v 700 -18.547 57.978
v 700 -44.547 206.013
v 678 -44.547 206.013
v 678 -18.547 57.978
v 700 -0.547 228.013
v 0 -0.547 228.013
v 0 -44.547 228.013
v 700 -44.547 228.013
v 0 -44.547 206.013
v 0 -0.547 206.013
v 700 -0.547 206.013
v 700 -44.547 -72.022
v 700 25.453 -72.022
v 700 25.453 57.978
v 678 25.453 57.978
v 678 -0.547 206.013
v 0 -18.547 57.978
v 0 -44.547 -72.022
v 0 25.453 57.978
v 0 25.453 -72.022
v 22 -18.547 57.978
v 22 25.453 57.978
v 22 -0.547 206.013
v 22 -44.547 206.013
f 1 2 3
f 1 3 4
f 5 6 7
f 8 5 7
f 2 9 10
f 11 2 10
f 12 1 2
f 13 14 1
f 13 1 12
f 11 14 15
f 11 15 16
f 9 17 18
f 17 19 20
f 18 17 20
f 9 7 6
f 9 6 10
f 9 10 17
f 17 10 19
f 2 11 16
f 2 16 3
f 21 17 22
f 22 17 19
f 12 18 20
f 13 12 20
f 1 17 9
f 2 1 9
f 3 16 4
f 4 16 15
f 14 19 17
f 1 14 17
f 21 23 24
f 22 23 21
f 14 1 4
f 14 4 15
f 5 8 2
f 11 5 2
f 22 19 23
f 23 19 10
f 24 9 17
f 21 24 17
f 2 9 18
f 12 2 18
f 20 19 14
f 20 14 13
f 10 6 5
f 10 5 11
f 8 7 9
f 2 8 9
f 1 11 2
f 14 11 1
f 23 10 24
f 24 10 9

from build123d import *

# Parameters (mm, degrees)
ESQUISSE1_W        = 130
ESQUISSE1_H        = 22
ESQUISSE1_W_2      = 22
BOSS_EXTRU_1_DEPTH = 700
BOSS_EXTRU_5_DEPTH = 22
BOSS_EXTRU_7_DEPTH = 22


with BuildPart() as part:
    # Esquisse1 → Boss.-Extru.1 (new body)
    with BuildSketch(Plane(origin=(0, 0, 0), x_dir=(0, 0, -1), z_dir=(1, 0, 0))):
        with Locations((7.021510311, 14.453362141)):
            Rectangle(ESQUISSE1_W, ESQUISSE1_H)
        Polygon((-57.978489689, 3.453362141), (-57.978489689, -18.546637859), (-57.978489689, -44.546637859), (72.021510311, -44.546637859), (72.021510311, 3.453362141), align=None)
        Polygon((-57.978489689, -44.546637859), (-57.978489689, -18.546637859), (-206.012573602, -44.546637859), align=None)
        with Locations((-217.012573602, -33.546637859)):
            Rectangle(ESQUISSE1_W_2, ESQUISSE1_H)
        with Locations((-217.012573602, -11.546637859)):
            Rectangle(ESQUISSE1_W_2, ESQUISSE1_H)
    extrude(amount=BOSS_EXTRU_1_DEPTH)


with BuildPart() as body_2:
    # Esquisse2 → Boss.-Extru.5 (new body)
    with BuildSketch(Plane(origin=(700, 0, 0), x_dir=(0, 0, -1), z_dir=(1, 0, 0))):
        Polygon((-57.978489689, 25.453362141), (-206.012573602, -0.546637859), (-206.012573602, -44.546637859), (-57.978489689, -18.546637859), align=None)
    extrude(amount=-BOSS_EXTRU_5_DEPTH)


with BuildPart() as body_3:
    # Esquisse3 → Boss.-Extru.7 (new body)
    with BuildSketch(Plane.ZY):
        Polygon((57.978489689, 25.453362141), (206.012573602, -0.546637859), (206.012573602, -44.546637859), (57.978489689, -18.546637859), align=None)
    extrude(amount=-BOSS_EXTRU_7_DEPTH)


solid = Compound([part.part, body_2.part, body_3.part])
